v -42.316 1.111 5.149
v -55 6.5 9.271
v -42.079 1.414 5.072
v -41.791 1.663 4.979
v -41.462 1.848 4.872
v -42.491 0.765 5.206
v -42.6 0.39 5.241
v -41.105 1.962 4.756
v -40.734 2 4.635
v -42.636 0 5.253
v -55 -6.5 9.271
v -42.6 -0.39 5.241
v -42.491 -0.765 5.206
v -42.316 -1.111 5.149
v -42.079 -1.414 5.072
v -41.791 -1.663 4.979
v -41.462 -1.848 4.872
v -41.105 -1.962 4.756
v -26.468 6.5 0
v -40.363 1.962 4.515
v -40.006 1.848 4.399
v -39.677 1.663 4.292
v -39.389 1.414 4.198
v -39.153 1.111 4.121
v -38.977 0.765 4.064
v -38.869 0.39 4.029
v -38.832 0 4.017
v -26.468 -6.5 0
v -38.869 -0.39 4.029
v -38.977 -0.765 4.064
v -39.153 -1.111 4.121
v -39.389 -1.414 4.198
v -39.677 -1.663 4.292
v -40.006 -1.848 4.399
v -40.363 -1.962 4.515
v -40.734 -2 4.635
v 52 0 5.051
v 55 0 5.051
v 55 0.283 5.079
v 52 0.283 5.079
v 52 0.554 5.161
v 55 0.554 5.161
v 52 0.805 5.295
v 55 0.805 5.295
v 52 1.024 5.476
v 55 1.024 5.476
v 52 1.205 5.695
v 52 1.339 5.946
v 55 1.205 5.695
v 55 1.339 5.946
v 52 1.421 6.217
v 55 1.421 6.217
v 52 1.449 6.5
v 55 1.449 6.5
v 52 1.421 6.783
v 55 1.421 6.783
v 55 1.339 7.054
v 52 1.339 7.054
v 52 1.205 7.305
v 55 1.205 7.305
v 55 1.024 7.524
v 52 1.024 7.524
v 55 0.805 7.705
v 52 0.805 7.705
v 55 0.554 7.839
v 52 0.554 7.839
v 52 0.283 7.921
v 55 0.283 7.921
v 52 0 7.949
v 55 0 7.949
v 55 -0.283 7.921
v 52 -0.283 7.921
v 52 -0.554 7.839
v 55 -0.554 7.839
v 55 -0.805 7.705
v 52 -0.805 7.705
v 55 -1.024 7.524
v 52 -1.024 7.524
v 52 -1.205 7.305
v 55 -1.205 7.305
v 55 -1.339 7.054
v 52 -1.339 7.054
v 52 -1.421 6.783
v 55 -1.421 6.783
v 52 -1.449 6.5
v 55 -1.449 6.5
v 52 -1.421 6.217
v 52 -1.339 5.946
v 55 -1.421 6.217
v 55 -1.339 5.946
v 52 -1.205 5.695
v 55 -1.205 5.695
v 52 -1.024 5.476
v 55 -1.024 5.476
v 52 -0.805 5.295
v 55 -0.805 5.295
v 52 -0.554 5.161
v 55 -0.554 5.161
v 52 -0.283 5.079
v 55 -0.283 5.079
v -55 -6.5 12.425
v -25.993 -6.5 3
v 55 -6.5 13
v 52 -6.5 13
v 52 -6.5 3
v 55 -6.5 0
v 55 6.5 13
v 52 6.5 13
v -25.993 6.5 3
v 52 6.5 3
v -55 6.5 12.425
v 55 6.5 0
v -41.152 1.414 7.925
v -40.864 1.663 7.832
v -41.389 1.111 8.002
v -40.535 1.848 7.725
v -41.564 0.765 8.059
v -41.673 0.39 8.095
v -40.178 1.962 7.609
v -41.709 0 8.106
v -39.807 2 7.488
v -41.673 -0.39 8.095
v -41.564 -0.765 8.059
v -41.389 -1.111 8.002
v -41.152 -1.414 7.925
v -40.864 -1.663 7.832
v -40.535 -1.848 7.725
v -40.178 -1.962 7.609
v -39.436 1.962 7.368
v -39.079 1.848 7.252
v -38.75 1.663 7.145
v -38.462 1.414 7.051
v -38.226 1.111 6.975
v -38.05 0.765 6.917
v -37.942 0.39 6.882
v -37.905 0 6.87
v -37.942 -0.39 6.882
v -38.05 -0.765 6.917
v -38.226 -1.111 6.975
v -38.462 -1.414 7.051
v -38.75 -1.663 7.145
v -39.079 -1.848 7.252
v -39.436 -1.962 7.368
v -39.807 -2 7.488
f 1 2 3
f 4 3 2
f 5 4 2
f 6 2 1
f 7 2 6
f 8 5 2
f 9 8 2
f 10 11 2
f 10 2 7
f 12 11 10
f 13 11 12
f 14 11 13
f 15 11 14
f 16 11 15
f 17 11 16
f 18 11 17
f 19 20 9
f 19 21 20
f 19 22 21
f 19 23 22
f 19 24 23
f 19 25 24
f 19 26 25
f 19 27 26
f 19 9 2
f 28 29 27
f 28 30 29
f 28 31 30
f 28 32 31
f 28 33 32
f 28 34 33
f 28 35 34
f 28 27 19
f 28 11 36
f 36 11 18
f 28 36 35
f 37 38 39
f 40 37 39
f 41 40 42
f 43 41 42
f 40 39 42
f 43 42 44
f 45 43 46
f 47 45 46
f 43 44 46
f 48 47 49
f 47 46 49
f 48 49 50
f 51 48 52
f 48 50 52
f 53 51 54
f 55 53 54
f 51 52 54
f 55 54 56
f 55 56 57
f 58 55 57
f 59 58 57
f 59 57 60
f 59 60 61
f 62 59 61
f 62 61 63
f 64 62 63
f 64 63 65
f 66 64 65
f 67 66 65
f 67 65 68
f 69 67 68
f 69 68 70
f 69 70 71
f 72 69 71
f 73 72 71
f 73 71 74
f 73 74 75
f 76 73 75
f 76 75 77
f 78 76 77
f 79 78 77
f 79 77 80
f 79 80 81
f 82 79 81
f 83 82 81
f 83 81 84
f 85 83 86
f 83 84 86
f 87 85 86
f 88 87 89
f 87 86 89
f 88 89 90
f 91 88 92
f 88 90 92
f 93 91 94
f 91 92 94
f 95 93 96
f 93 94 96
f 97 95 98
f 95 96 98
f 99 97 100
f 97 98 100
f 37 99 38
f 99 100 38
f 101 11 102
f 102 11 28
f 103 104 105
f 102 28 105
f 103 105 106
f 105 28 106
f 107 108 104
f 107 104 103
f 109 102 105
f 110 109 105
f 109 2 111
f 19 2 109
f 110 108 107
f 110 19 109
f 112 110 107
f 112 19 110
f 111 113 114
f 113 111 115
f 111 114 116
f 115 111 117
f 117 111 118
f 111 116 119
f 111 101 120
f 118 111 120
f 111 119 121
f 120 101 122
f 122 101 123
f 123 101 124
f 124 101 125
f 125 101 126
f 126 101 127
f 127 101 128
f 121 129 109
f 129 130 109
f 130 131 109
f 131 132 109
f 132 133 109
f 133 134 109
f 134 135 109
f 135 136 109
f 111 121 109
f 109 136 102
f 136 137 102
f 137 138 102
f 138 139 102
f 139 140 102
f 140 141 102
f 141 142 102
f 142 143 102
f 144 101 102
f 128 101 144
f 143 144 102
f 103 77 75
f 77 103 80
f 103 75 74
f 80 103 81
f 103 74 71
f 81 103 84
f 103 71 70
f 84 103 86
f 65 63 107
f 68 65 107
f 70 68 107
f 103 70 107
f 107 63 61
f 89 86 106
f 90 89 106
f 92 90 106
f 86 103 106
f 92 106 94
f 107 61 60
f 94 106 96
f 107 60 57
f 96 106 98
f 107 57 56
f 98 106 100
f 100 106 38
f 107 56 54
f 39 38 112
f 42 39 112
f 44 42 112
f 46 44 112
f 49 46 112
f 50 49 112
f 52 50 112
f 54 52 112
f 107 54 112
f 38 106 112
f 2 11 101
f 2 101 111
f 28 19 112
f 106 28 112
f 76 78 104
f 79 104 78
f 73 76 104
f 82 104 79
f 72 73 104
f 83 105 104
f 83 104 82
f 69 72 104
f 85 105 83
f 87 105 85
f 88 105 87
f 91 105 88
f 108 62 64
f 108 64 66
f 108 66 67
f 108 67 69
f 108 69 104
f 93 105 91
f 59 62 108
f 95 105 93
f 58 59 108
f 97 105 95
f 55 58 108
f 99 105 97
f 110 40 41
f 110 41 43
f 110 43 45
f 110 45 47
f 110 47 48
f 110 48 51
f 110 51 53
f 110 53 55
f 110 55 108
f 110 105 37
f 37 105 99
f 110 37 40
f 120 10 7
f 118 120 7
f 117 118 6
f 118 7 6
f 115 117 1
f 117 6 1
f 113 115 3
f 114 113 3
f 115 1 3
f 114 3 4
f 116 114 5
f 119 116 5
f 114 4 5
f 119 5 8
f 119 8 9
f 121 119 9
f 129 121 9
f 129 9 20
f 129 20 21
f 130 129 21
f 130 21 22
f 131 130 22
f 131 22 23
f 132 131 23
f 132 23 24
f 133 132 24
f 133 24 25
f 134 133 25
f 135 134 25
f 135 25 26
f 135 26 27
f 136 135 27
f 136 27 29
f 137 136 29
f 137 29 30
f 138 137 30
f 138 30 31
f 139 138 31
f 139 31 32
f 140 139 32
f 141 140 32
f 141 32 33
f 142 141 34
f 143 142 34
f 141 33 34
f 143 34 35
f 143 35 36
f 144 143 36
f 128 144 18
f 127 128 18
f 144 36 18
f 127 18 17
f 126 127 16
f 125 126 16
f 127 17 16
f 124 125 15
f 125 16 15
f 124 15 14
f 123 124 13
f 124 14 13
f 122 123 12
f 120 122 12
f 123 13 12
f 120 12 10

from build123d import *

# Parameters (mm, degrees)
SKETCH1_W           = 110
SKETCH1_H           = 13
BOSS_EXTRUDE1_DEPTH = 50
CUT_EXTRUDE1_DEPTH  = 76.45859792
CUT_EXTRUDE2_DEPTH  = 76.45859792
SKETCH4_R           = 2
CUT_EXTRUDE3_DEPTH  = 62.317648321
SKETCH5_W           = 3
SKETCH5_H           = 13
BOSS_EXTRUDE2_DEPTH = 10
SKETCH6_R           = 1.448838416
CUT_EXTRUDE5_DEPTH  = 12


with BuildPart() as part:
    # Sketch1 → Boss-Extrude1 (new body)
    with BuildSketch(Plane.XY):
        Rectangle(SKETCH1_W, SKETCH1_H)
    extrude(amount=BOSS_EXTRUDE1_DEPTH)

    # Sketch2 → Cut-Extrude1 (cut, through all)
    with BuildSketch(Plane.XZ.offset(6.5)):
        Polygon((-55, 9.270509831), (-26.468304511, 0), (-55, 0), align=None)
    extrude(amount=-CUT_EXTRUDE1_DEPTH, mode=Mode.SUBTRACT)

    # Sketch3 → Cut-Extrude2 (cut, through all)
    with BuildSketch(Plane.XZ.offset(6.5)):
        Polygon((-55, 12.424896504), (-25.99315119, 3), (55, 3), (55, 50), (-55, 50), align=None)
    extrude(amount=-CUT_EXTRUDE2_DEPTH, mode=Mode.SUBTRACT)

    # Sketch4 → Cut-Extrude3 (cut, through all)
    with BuildSketch(Plane(origin=(-2.527498175, 0, -7.778839522), x_dir=(-0.9510565162951533, 0, 0.30901699437494845), z_dir=(-0.30901699437494845, 0, -0.9510565162951533))):
        with Locations((40.172853481, 0)):
            Circle(SKETCH4_R)
    extrude(amount=-CUT_EXTRUDE3_DEPTH, mode=Mode.SUBTRACT)

    # Sketch5 → Boss-Extrude2 (add)
    with BuildSketch(Plane.XY.offset(3)):
        with Locations((53.5, 0)):
            Rectangle(SKETCH5_W, SKETCH5_H)
    extrude(amount=BOSS_EXTRUDE2_DEPTH)

    # Sketch6 → Cut-Extrude5 (cut)
    with BuildSketch(Plane(origin=(55, 0, 0), x_dir=(0, 0, -1), z_dir=(1, 0, 0))):
        with Locations((-6.5, 0)):
            Circle(SKETCH6_R)
    extrude(amount=-CUT_EXTRUDE5_DEPTH, mode=Mode.SUBTRACT)


solid = part.part
